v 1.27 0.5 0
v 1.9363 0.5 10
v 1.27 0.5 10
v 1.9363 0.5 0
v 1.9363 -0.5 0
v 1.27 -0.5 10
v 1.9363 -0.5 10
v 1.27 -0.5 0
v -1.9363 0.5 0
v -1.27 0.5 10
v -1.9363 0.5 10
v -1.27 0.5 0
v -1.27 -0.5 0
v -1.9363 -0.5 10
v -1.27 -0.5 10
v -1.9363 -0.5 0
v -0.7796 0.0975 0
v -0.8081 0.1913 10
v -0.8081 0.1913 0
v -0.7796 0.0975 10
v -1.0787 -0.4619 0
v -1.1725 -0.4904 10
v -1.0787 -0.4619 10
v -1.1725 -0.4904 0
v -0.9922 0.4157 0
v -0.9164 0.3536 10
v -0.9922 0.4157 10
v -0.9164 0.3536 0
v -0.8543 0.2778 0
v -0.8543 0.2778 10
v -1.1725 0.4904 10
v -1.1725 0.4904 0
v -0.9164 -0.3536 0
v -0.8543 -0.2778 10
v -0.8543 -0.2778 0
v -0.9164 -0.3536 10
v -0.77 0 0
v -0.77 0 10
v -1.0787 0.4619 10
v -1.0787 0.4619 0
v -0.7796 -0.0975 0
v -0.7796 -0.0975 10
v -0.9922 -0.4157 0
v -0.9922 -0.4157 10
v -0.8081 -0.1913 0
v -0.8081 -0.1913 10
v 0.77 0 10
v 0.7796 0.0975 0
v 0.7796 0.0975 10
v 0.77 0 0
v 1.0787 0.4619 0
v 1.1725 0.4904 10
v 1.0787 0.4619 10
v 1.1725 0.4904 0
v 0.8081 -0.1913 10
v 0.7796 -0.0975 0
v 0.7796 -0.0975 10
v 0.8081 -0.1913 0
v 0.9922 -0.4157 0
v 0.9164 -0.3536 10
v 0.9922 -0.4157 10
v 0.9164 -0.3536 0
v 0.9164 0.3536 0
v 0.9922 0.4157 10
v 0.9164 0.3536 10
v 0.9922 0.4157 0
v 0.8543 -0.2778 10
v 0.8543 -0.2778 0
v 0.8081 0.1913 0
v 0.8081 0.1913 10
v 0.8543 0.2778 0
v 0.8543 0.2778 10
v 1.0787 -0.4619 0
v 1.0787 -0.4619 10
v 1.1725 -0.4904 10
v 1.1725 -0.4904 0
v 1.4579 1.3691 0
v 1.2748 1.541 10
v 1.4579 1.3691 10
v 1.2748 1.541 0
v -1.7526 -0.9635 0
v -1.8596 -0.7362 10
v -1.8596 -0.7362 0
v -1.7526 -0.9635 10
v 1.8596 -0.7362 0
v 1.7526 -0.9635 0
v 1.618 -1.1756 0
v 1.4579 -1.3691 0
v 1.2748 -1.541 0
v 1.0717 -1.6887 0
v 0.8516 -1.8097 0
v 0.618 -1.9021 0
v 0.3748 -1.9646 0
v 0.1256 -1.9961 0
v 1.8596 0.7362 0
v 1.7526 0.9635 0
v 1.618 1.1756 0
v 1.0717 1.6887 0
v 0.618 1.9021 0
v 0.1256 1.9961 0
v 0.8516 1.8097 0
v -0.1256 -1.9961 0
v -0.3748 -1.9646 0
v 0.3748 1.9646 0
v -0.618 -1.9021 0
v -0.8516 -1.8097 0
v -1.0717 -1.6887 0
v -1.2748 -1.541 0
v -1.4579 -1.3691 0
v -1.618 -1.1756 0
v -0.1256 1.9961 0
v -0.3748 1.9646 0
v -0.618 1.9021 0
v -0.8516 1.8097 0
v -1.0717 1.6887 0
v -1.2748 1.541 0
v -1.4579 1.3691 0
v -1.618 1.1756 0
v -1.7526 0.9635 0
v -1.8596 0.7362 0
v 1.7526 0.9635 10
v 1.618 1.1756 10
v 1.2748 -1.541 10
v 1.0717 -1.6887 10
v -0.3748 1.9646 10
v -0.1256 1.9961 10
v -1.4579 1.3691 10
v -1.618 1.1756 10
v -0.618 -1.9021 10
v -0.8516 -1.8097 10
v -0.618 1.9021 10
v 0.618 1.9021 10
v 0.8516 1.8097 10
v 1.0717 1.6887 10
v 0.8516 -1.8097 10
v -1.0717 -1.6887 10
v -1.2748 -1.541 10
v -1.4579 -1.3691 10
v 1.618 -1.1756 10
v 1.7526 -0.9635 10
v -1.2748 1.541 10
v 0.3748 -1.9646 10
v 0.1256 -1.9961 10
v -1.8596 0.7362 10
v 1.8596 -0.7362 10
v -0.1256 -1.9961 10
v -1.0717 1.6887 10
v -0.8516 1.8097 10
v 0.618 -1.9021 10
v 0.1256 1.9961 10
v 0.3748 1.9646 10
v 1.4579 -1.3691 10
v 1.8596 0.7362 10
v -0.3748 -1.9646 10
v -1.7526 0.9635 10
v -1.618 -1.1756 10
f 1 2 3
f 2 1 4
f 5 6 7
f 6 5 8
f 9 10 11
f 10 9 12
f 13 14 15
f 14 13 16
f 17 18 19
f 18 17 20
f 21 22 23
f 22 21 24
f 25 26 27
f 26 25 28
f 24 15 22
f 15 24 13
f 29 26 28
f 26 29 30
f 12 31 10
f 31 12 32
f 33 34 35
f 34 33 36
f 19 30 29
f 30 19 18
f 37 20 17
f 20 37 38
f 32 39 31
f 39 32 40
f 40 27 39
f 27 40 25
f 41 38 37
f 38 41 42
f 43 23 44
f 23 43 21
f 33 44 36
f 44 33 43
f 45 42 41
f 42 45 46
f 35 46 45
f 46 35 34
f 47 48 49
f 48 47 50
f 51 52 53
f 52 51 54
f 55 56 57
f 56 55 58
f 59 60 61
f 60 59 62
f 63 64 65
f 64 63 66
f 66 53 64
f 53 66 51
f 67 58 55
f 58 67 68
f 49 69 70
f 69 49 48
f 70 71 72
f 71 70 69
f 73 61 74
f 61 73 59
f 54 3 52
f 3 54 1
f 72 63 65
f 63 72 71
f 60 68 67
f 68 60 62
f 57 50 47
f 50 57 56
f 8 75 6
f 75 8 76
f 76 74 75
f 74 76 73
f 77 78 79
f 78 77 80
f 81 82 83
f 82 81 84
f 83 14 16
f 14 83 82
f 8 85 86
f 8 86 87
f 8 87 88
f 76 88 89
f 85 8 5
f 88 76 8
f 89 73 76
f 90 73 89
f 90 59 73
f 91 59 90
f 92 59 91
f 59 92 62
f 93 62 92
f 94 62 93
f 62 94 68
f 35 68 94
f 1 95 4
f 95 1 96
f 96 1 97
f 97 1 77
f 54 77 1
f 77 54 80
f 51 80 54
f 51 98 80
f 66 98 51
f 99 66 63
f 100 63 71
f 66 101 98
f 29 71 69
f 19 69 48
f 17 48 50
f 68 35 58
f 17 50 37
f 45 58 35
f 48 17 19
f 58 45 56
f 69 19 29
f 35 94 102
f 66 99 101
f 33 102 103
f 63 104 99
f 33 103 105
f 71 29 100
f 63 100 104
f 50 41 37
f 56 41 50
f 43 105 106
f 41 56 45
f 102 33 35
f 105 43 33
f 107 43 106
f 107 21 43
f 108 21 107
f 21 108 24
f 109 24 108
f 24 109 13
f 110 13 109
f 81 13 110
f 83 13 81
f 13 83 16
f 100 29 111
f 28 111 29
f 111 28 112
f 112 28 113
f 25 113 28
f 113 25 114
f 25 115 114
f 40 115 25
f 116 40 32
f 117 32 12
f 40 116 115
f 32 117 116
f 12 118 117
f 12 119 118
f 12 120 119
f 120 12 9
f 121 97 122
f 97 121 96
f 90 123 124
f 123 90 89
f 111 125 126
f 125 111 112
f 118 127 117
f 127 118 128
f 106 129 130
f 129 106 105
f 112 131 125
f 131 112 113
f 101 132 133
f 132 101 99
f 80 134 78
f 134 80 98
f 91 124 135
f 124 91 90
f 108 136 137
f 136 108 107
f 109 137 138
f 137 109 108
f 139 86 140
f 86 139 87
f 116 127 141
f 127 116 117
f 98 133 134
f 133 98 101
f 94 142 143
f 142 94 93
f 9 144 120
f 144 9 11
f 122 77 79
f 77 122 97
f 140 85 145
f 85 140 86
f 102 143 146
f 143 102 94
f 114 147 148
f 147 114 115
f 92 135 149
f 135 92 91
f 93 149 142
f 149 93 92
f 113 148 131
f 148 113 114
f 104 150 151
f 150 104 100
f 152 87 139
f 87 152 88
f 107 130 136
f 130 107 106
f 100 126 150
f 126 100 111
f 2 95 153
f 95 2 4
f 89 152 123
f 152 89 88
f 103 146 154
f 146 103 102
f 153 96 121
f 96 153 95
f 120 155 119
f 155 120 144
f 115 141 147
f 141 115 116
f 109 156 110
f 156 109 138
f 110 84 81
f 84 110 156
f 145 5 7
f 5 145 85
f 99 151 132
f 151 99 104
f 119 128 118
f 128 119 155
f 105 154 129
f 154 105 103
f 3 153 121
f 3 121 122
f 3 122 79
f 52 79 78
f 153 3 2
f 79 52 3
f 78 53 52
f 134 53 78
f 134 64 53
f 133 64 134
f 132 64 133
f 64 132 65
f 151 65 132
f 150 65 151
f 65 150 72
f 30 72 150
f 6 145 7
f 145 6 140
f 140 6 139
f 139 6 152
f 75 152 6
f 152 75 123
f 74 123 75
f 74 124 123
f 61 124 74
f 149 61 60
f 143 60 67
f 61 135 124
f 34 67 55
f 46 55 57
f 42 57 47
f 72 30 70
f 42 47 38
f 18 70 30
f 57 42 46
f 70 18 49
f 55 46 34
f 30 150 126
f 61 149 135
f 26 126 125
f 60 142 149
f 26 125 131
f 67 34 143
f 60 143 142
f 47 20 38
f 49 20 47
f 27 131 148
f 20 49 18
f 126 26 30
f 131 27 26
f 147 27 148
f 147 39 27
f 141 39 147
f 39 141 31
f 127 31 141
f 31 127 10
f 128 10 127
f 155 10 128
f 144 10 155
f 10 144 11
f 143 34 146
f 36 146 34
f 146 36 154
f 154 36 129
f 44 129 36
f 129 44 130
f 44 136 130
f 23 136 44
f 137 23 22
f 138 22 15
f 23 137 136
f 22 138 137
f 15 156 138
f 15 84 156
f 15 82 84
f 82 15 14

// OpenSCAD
/* [Led Type] */
side_opened= "true"; //[true:Opened, false:Closed]
led_diameter= 3; //[3:3mm, 5:5mm, 8:8mm, 10:10mm]
number_of_pins= 2; //[2:2, 3:3, 4:4]
pins_spacing= 2.54;
height= 10;

difference () {
    cylinder (h= height, d= led_diameter + 1, $fn= 50);
    union () {
        if (number_of_pins == 2) {
            translate ([-pins_spacing / 2, 0, -0.1]) cylinder (h= height + 0.2, d= 1, $fn= 32);
            translate ([pins_spacing / 2, 0, -0.1]) cylinder (h= height + 0.2, d= 1, $fn= 32);
            if (side_opened == "true" && pins_spacing > 1) {
                translate ([pins_spacing / 2 + 50, 0, height / 2])
                    cube (size= [100, 1, height + 0.2], center= true);
                translate ([-pins_spacing / 2 - 50, 0, height/ 2])
                    cube (size= [100, 1, height + 0.2], center= true);
            }
        } else if (number_of_pins == 3) {
            translate ([0, 0, -0.1]) cylinder (h= height + 0.2, d= 1, $fn= 50);
            translate ([-pins_spacing, 0, -0.1]) cylinder (h= height + 0.2, d= 1, $fn= 32);
            translate ([pins_spacing, 0, -0.1]) cylinder (h= height + 0.2, d= 1, $fn= 32);
            if (side_opened == "true" && pins_spacing > 1) {
                translate ([-0.5, 0, -0.1]) cube (size= [1, 100, height + 0.2]);
                translate ([pins_spacing - 0.5, 0, -0.1]) cube (size= [1, 100, height + 0.2]);
                translate ([-pins_spacing - 0.5, 0, -0.1]) cube (size= [1, 100, height + 0.2]);
            }
        } else if (number_of_pins == 4) {
            translate ([-pins_spacing / 2, 0, -0.1]) cylinder (h= height + 0.2, d= 1, $fn= 32);
            translate ([pins_spacing / 2, 0, -0.1]) cylinder (h= height + 0.2, d= 1, $fn= 32);
            translate ([-pins_spacing - pins_spacing / 2, 0, -0.1])
                cylinder (h= height + 0.2, d= 1, $fn= 32);
            translate ([pins_spacing + pins_spacing / 2, 0, -0.1])
                cylinder (h= height + 0.2, d= 1, $fn= 32);
            if (side_opened == "true" && pins_spacing > 1) {
                translate ([pins_spacing / 2 - 0.5, 0, -0.1]) cube (size= [1, 100, height + 0.2]);
                translate ([-pins_spacing / 2 - 0.5, 0, -0.1]) cube (size= [1, 100, height + 0.2]);
                translate ([pins_spacing + pins_spacing / 2 - 0.5, 0, -0.1])
                    cube (size= [1, 100, height + 0.2]);
                translate ([-pins_spacing - pins_spacing / 2 - 0.5, 0, -0.1])
                    cube (size= [1, 100, height + 0.2]);
            }
        }
        if (pins_spacing <= 1)
        {
            translate ([0, 0, height / 2])
                cube (size= [(number_of_pins - 1) * pins_spacing, 1, height + 0.2],
                center= true);
            if (side_opened == "true")
                translate ([0, 50, height / 2])
                    cube (size= [(number_of_pins - 1) * pins_spacing + 1, 100, height + 0.2],
                    center= true);
        }
    }
}
